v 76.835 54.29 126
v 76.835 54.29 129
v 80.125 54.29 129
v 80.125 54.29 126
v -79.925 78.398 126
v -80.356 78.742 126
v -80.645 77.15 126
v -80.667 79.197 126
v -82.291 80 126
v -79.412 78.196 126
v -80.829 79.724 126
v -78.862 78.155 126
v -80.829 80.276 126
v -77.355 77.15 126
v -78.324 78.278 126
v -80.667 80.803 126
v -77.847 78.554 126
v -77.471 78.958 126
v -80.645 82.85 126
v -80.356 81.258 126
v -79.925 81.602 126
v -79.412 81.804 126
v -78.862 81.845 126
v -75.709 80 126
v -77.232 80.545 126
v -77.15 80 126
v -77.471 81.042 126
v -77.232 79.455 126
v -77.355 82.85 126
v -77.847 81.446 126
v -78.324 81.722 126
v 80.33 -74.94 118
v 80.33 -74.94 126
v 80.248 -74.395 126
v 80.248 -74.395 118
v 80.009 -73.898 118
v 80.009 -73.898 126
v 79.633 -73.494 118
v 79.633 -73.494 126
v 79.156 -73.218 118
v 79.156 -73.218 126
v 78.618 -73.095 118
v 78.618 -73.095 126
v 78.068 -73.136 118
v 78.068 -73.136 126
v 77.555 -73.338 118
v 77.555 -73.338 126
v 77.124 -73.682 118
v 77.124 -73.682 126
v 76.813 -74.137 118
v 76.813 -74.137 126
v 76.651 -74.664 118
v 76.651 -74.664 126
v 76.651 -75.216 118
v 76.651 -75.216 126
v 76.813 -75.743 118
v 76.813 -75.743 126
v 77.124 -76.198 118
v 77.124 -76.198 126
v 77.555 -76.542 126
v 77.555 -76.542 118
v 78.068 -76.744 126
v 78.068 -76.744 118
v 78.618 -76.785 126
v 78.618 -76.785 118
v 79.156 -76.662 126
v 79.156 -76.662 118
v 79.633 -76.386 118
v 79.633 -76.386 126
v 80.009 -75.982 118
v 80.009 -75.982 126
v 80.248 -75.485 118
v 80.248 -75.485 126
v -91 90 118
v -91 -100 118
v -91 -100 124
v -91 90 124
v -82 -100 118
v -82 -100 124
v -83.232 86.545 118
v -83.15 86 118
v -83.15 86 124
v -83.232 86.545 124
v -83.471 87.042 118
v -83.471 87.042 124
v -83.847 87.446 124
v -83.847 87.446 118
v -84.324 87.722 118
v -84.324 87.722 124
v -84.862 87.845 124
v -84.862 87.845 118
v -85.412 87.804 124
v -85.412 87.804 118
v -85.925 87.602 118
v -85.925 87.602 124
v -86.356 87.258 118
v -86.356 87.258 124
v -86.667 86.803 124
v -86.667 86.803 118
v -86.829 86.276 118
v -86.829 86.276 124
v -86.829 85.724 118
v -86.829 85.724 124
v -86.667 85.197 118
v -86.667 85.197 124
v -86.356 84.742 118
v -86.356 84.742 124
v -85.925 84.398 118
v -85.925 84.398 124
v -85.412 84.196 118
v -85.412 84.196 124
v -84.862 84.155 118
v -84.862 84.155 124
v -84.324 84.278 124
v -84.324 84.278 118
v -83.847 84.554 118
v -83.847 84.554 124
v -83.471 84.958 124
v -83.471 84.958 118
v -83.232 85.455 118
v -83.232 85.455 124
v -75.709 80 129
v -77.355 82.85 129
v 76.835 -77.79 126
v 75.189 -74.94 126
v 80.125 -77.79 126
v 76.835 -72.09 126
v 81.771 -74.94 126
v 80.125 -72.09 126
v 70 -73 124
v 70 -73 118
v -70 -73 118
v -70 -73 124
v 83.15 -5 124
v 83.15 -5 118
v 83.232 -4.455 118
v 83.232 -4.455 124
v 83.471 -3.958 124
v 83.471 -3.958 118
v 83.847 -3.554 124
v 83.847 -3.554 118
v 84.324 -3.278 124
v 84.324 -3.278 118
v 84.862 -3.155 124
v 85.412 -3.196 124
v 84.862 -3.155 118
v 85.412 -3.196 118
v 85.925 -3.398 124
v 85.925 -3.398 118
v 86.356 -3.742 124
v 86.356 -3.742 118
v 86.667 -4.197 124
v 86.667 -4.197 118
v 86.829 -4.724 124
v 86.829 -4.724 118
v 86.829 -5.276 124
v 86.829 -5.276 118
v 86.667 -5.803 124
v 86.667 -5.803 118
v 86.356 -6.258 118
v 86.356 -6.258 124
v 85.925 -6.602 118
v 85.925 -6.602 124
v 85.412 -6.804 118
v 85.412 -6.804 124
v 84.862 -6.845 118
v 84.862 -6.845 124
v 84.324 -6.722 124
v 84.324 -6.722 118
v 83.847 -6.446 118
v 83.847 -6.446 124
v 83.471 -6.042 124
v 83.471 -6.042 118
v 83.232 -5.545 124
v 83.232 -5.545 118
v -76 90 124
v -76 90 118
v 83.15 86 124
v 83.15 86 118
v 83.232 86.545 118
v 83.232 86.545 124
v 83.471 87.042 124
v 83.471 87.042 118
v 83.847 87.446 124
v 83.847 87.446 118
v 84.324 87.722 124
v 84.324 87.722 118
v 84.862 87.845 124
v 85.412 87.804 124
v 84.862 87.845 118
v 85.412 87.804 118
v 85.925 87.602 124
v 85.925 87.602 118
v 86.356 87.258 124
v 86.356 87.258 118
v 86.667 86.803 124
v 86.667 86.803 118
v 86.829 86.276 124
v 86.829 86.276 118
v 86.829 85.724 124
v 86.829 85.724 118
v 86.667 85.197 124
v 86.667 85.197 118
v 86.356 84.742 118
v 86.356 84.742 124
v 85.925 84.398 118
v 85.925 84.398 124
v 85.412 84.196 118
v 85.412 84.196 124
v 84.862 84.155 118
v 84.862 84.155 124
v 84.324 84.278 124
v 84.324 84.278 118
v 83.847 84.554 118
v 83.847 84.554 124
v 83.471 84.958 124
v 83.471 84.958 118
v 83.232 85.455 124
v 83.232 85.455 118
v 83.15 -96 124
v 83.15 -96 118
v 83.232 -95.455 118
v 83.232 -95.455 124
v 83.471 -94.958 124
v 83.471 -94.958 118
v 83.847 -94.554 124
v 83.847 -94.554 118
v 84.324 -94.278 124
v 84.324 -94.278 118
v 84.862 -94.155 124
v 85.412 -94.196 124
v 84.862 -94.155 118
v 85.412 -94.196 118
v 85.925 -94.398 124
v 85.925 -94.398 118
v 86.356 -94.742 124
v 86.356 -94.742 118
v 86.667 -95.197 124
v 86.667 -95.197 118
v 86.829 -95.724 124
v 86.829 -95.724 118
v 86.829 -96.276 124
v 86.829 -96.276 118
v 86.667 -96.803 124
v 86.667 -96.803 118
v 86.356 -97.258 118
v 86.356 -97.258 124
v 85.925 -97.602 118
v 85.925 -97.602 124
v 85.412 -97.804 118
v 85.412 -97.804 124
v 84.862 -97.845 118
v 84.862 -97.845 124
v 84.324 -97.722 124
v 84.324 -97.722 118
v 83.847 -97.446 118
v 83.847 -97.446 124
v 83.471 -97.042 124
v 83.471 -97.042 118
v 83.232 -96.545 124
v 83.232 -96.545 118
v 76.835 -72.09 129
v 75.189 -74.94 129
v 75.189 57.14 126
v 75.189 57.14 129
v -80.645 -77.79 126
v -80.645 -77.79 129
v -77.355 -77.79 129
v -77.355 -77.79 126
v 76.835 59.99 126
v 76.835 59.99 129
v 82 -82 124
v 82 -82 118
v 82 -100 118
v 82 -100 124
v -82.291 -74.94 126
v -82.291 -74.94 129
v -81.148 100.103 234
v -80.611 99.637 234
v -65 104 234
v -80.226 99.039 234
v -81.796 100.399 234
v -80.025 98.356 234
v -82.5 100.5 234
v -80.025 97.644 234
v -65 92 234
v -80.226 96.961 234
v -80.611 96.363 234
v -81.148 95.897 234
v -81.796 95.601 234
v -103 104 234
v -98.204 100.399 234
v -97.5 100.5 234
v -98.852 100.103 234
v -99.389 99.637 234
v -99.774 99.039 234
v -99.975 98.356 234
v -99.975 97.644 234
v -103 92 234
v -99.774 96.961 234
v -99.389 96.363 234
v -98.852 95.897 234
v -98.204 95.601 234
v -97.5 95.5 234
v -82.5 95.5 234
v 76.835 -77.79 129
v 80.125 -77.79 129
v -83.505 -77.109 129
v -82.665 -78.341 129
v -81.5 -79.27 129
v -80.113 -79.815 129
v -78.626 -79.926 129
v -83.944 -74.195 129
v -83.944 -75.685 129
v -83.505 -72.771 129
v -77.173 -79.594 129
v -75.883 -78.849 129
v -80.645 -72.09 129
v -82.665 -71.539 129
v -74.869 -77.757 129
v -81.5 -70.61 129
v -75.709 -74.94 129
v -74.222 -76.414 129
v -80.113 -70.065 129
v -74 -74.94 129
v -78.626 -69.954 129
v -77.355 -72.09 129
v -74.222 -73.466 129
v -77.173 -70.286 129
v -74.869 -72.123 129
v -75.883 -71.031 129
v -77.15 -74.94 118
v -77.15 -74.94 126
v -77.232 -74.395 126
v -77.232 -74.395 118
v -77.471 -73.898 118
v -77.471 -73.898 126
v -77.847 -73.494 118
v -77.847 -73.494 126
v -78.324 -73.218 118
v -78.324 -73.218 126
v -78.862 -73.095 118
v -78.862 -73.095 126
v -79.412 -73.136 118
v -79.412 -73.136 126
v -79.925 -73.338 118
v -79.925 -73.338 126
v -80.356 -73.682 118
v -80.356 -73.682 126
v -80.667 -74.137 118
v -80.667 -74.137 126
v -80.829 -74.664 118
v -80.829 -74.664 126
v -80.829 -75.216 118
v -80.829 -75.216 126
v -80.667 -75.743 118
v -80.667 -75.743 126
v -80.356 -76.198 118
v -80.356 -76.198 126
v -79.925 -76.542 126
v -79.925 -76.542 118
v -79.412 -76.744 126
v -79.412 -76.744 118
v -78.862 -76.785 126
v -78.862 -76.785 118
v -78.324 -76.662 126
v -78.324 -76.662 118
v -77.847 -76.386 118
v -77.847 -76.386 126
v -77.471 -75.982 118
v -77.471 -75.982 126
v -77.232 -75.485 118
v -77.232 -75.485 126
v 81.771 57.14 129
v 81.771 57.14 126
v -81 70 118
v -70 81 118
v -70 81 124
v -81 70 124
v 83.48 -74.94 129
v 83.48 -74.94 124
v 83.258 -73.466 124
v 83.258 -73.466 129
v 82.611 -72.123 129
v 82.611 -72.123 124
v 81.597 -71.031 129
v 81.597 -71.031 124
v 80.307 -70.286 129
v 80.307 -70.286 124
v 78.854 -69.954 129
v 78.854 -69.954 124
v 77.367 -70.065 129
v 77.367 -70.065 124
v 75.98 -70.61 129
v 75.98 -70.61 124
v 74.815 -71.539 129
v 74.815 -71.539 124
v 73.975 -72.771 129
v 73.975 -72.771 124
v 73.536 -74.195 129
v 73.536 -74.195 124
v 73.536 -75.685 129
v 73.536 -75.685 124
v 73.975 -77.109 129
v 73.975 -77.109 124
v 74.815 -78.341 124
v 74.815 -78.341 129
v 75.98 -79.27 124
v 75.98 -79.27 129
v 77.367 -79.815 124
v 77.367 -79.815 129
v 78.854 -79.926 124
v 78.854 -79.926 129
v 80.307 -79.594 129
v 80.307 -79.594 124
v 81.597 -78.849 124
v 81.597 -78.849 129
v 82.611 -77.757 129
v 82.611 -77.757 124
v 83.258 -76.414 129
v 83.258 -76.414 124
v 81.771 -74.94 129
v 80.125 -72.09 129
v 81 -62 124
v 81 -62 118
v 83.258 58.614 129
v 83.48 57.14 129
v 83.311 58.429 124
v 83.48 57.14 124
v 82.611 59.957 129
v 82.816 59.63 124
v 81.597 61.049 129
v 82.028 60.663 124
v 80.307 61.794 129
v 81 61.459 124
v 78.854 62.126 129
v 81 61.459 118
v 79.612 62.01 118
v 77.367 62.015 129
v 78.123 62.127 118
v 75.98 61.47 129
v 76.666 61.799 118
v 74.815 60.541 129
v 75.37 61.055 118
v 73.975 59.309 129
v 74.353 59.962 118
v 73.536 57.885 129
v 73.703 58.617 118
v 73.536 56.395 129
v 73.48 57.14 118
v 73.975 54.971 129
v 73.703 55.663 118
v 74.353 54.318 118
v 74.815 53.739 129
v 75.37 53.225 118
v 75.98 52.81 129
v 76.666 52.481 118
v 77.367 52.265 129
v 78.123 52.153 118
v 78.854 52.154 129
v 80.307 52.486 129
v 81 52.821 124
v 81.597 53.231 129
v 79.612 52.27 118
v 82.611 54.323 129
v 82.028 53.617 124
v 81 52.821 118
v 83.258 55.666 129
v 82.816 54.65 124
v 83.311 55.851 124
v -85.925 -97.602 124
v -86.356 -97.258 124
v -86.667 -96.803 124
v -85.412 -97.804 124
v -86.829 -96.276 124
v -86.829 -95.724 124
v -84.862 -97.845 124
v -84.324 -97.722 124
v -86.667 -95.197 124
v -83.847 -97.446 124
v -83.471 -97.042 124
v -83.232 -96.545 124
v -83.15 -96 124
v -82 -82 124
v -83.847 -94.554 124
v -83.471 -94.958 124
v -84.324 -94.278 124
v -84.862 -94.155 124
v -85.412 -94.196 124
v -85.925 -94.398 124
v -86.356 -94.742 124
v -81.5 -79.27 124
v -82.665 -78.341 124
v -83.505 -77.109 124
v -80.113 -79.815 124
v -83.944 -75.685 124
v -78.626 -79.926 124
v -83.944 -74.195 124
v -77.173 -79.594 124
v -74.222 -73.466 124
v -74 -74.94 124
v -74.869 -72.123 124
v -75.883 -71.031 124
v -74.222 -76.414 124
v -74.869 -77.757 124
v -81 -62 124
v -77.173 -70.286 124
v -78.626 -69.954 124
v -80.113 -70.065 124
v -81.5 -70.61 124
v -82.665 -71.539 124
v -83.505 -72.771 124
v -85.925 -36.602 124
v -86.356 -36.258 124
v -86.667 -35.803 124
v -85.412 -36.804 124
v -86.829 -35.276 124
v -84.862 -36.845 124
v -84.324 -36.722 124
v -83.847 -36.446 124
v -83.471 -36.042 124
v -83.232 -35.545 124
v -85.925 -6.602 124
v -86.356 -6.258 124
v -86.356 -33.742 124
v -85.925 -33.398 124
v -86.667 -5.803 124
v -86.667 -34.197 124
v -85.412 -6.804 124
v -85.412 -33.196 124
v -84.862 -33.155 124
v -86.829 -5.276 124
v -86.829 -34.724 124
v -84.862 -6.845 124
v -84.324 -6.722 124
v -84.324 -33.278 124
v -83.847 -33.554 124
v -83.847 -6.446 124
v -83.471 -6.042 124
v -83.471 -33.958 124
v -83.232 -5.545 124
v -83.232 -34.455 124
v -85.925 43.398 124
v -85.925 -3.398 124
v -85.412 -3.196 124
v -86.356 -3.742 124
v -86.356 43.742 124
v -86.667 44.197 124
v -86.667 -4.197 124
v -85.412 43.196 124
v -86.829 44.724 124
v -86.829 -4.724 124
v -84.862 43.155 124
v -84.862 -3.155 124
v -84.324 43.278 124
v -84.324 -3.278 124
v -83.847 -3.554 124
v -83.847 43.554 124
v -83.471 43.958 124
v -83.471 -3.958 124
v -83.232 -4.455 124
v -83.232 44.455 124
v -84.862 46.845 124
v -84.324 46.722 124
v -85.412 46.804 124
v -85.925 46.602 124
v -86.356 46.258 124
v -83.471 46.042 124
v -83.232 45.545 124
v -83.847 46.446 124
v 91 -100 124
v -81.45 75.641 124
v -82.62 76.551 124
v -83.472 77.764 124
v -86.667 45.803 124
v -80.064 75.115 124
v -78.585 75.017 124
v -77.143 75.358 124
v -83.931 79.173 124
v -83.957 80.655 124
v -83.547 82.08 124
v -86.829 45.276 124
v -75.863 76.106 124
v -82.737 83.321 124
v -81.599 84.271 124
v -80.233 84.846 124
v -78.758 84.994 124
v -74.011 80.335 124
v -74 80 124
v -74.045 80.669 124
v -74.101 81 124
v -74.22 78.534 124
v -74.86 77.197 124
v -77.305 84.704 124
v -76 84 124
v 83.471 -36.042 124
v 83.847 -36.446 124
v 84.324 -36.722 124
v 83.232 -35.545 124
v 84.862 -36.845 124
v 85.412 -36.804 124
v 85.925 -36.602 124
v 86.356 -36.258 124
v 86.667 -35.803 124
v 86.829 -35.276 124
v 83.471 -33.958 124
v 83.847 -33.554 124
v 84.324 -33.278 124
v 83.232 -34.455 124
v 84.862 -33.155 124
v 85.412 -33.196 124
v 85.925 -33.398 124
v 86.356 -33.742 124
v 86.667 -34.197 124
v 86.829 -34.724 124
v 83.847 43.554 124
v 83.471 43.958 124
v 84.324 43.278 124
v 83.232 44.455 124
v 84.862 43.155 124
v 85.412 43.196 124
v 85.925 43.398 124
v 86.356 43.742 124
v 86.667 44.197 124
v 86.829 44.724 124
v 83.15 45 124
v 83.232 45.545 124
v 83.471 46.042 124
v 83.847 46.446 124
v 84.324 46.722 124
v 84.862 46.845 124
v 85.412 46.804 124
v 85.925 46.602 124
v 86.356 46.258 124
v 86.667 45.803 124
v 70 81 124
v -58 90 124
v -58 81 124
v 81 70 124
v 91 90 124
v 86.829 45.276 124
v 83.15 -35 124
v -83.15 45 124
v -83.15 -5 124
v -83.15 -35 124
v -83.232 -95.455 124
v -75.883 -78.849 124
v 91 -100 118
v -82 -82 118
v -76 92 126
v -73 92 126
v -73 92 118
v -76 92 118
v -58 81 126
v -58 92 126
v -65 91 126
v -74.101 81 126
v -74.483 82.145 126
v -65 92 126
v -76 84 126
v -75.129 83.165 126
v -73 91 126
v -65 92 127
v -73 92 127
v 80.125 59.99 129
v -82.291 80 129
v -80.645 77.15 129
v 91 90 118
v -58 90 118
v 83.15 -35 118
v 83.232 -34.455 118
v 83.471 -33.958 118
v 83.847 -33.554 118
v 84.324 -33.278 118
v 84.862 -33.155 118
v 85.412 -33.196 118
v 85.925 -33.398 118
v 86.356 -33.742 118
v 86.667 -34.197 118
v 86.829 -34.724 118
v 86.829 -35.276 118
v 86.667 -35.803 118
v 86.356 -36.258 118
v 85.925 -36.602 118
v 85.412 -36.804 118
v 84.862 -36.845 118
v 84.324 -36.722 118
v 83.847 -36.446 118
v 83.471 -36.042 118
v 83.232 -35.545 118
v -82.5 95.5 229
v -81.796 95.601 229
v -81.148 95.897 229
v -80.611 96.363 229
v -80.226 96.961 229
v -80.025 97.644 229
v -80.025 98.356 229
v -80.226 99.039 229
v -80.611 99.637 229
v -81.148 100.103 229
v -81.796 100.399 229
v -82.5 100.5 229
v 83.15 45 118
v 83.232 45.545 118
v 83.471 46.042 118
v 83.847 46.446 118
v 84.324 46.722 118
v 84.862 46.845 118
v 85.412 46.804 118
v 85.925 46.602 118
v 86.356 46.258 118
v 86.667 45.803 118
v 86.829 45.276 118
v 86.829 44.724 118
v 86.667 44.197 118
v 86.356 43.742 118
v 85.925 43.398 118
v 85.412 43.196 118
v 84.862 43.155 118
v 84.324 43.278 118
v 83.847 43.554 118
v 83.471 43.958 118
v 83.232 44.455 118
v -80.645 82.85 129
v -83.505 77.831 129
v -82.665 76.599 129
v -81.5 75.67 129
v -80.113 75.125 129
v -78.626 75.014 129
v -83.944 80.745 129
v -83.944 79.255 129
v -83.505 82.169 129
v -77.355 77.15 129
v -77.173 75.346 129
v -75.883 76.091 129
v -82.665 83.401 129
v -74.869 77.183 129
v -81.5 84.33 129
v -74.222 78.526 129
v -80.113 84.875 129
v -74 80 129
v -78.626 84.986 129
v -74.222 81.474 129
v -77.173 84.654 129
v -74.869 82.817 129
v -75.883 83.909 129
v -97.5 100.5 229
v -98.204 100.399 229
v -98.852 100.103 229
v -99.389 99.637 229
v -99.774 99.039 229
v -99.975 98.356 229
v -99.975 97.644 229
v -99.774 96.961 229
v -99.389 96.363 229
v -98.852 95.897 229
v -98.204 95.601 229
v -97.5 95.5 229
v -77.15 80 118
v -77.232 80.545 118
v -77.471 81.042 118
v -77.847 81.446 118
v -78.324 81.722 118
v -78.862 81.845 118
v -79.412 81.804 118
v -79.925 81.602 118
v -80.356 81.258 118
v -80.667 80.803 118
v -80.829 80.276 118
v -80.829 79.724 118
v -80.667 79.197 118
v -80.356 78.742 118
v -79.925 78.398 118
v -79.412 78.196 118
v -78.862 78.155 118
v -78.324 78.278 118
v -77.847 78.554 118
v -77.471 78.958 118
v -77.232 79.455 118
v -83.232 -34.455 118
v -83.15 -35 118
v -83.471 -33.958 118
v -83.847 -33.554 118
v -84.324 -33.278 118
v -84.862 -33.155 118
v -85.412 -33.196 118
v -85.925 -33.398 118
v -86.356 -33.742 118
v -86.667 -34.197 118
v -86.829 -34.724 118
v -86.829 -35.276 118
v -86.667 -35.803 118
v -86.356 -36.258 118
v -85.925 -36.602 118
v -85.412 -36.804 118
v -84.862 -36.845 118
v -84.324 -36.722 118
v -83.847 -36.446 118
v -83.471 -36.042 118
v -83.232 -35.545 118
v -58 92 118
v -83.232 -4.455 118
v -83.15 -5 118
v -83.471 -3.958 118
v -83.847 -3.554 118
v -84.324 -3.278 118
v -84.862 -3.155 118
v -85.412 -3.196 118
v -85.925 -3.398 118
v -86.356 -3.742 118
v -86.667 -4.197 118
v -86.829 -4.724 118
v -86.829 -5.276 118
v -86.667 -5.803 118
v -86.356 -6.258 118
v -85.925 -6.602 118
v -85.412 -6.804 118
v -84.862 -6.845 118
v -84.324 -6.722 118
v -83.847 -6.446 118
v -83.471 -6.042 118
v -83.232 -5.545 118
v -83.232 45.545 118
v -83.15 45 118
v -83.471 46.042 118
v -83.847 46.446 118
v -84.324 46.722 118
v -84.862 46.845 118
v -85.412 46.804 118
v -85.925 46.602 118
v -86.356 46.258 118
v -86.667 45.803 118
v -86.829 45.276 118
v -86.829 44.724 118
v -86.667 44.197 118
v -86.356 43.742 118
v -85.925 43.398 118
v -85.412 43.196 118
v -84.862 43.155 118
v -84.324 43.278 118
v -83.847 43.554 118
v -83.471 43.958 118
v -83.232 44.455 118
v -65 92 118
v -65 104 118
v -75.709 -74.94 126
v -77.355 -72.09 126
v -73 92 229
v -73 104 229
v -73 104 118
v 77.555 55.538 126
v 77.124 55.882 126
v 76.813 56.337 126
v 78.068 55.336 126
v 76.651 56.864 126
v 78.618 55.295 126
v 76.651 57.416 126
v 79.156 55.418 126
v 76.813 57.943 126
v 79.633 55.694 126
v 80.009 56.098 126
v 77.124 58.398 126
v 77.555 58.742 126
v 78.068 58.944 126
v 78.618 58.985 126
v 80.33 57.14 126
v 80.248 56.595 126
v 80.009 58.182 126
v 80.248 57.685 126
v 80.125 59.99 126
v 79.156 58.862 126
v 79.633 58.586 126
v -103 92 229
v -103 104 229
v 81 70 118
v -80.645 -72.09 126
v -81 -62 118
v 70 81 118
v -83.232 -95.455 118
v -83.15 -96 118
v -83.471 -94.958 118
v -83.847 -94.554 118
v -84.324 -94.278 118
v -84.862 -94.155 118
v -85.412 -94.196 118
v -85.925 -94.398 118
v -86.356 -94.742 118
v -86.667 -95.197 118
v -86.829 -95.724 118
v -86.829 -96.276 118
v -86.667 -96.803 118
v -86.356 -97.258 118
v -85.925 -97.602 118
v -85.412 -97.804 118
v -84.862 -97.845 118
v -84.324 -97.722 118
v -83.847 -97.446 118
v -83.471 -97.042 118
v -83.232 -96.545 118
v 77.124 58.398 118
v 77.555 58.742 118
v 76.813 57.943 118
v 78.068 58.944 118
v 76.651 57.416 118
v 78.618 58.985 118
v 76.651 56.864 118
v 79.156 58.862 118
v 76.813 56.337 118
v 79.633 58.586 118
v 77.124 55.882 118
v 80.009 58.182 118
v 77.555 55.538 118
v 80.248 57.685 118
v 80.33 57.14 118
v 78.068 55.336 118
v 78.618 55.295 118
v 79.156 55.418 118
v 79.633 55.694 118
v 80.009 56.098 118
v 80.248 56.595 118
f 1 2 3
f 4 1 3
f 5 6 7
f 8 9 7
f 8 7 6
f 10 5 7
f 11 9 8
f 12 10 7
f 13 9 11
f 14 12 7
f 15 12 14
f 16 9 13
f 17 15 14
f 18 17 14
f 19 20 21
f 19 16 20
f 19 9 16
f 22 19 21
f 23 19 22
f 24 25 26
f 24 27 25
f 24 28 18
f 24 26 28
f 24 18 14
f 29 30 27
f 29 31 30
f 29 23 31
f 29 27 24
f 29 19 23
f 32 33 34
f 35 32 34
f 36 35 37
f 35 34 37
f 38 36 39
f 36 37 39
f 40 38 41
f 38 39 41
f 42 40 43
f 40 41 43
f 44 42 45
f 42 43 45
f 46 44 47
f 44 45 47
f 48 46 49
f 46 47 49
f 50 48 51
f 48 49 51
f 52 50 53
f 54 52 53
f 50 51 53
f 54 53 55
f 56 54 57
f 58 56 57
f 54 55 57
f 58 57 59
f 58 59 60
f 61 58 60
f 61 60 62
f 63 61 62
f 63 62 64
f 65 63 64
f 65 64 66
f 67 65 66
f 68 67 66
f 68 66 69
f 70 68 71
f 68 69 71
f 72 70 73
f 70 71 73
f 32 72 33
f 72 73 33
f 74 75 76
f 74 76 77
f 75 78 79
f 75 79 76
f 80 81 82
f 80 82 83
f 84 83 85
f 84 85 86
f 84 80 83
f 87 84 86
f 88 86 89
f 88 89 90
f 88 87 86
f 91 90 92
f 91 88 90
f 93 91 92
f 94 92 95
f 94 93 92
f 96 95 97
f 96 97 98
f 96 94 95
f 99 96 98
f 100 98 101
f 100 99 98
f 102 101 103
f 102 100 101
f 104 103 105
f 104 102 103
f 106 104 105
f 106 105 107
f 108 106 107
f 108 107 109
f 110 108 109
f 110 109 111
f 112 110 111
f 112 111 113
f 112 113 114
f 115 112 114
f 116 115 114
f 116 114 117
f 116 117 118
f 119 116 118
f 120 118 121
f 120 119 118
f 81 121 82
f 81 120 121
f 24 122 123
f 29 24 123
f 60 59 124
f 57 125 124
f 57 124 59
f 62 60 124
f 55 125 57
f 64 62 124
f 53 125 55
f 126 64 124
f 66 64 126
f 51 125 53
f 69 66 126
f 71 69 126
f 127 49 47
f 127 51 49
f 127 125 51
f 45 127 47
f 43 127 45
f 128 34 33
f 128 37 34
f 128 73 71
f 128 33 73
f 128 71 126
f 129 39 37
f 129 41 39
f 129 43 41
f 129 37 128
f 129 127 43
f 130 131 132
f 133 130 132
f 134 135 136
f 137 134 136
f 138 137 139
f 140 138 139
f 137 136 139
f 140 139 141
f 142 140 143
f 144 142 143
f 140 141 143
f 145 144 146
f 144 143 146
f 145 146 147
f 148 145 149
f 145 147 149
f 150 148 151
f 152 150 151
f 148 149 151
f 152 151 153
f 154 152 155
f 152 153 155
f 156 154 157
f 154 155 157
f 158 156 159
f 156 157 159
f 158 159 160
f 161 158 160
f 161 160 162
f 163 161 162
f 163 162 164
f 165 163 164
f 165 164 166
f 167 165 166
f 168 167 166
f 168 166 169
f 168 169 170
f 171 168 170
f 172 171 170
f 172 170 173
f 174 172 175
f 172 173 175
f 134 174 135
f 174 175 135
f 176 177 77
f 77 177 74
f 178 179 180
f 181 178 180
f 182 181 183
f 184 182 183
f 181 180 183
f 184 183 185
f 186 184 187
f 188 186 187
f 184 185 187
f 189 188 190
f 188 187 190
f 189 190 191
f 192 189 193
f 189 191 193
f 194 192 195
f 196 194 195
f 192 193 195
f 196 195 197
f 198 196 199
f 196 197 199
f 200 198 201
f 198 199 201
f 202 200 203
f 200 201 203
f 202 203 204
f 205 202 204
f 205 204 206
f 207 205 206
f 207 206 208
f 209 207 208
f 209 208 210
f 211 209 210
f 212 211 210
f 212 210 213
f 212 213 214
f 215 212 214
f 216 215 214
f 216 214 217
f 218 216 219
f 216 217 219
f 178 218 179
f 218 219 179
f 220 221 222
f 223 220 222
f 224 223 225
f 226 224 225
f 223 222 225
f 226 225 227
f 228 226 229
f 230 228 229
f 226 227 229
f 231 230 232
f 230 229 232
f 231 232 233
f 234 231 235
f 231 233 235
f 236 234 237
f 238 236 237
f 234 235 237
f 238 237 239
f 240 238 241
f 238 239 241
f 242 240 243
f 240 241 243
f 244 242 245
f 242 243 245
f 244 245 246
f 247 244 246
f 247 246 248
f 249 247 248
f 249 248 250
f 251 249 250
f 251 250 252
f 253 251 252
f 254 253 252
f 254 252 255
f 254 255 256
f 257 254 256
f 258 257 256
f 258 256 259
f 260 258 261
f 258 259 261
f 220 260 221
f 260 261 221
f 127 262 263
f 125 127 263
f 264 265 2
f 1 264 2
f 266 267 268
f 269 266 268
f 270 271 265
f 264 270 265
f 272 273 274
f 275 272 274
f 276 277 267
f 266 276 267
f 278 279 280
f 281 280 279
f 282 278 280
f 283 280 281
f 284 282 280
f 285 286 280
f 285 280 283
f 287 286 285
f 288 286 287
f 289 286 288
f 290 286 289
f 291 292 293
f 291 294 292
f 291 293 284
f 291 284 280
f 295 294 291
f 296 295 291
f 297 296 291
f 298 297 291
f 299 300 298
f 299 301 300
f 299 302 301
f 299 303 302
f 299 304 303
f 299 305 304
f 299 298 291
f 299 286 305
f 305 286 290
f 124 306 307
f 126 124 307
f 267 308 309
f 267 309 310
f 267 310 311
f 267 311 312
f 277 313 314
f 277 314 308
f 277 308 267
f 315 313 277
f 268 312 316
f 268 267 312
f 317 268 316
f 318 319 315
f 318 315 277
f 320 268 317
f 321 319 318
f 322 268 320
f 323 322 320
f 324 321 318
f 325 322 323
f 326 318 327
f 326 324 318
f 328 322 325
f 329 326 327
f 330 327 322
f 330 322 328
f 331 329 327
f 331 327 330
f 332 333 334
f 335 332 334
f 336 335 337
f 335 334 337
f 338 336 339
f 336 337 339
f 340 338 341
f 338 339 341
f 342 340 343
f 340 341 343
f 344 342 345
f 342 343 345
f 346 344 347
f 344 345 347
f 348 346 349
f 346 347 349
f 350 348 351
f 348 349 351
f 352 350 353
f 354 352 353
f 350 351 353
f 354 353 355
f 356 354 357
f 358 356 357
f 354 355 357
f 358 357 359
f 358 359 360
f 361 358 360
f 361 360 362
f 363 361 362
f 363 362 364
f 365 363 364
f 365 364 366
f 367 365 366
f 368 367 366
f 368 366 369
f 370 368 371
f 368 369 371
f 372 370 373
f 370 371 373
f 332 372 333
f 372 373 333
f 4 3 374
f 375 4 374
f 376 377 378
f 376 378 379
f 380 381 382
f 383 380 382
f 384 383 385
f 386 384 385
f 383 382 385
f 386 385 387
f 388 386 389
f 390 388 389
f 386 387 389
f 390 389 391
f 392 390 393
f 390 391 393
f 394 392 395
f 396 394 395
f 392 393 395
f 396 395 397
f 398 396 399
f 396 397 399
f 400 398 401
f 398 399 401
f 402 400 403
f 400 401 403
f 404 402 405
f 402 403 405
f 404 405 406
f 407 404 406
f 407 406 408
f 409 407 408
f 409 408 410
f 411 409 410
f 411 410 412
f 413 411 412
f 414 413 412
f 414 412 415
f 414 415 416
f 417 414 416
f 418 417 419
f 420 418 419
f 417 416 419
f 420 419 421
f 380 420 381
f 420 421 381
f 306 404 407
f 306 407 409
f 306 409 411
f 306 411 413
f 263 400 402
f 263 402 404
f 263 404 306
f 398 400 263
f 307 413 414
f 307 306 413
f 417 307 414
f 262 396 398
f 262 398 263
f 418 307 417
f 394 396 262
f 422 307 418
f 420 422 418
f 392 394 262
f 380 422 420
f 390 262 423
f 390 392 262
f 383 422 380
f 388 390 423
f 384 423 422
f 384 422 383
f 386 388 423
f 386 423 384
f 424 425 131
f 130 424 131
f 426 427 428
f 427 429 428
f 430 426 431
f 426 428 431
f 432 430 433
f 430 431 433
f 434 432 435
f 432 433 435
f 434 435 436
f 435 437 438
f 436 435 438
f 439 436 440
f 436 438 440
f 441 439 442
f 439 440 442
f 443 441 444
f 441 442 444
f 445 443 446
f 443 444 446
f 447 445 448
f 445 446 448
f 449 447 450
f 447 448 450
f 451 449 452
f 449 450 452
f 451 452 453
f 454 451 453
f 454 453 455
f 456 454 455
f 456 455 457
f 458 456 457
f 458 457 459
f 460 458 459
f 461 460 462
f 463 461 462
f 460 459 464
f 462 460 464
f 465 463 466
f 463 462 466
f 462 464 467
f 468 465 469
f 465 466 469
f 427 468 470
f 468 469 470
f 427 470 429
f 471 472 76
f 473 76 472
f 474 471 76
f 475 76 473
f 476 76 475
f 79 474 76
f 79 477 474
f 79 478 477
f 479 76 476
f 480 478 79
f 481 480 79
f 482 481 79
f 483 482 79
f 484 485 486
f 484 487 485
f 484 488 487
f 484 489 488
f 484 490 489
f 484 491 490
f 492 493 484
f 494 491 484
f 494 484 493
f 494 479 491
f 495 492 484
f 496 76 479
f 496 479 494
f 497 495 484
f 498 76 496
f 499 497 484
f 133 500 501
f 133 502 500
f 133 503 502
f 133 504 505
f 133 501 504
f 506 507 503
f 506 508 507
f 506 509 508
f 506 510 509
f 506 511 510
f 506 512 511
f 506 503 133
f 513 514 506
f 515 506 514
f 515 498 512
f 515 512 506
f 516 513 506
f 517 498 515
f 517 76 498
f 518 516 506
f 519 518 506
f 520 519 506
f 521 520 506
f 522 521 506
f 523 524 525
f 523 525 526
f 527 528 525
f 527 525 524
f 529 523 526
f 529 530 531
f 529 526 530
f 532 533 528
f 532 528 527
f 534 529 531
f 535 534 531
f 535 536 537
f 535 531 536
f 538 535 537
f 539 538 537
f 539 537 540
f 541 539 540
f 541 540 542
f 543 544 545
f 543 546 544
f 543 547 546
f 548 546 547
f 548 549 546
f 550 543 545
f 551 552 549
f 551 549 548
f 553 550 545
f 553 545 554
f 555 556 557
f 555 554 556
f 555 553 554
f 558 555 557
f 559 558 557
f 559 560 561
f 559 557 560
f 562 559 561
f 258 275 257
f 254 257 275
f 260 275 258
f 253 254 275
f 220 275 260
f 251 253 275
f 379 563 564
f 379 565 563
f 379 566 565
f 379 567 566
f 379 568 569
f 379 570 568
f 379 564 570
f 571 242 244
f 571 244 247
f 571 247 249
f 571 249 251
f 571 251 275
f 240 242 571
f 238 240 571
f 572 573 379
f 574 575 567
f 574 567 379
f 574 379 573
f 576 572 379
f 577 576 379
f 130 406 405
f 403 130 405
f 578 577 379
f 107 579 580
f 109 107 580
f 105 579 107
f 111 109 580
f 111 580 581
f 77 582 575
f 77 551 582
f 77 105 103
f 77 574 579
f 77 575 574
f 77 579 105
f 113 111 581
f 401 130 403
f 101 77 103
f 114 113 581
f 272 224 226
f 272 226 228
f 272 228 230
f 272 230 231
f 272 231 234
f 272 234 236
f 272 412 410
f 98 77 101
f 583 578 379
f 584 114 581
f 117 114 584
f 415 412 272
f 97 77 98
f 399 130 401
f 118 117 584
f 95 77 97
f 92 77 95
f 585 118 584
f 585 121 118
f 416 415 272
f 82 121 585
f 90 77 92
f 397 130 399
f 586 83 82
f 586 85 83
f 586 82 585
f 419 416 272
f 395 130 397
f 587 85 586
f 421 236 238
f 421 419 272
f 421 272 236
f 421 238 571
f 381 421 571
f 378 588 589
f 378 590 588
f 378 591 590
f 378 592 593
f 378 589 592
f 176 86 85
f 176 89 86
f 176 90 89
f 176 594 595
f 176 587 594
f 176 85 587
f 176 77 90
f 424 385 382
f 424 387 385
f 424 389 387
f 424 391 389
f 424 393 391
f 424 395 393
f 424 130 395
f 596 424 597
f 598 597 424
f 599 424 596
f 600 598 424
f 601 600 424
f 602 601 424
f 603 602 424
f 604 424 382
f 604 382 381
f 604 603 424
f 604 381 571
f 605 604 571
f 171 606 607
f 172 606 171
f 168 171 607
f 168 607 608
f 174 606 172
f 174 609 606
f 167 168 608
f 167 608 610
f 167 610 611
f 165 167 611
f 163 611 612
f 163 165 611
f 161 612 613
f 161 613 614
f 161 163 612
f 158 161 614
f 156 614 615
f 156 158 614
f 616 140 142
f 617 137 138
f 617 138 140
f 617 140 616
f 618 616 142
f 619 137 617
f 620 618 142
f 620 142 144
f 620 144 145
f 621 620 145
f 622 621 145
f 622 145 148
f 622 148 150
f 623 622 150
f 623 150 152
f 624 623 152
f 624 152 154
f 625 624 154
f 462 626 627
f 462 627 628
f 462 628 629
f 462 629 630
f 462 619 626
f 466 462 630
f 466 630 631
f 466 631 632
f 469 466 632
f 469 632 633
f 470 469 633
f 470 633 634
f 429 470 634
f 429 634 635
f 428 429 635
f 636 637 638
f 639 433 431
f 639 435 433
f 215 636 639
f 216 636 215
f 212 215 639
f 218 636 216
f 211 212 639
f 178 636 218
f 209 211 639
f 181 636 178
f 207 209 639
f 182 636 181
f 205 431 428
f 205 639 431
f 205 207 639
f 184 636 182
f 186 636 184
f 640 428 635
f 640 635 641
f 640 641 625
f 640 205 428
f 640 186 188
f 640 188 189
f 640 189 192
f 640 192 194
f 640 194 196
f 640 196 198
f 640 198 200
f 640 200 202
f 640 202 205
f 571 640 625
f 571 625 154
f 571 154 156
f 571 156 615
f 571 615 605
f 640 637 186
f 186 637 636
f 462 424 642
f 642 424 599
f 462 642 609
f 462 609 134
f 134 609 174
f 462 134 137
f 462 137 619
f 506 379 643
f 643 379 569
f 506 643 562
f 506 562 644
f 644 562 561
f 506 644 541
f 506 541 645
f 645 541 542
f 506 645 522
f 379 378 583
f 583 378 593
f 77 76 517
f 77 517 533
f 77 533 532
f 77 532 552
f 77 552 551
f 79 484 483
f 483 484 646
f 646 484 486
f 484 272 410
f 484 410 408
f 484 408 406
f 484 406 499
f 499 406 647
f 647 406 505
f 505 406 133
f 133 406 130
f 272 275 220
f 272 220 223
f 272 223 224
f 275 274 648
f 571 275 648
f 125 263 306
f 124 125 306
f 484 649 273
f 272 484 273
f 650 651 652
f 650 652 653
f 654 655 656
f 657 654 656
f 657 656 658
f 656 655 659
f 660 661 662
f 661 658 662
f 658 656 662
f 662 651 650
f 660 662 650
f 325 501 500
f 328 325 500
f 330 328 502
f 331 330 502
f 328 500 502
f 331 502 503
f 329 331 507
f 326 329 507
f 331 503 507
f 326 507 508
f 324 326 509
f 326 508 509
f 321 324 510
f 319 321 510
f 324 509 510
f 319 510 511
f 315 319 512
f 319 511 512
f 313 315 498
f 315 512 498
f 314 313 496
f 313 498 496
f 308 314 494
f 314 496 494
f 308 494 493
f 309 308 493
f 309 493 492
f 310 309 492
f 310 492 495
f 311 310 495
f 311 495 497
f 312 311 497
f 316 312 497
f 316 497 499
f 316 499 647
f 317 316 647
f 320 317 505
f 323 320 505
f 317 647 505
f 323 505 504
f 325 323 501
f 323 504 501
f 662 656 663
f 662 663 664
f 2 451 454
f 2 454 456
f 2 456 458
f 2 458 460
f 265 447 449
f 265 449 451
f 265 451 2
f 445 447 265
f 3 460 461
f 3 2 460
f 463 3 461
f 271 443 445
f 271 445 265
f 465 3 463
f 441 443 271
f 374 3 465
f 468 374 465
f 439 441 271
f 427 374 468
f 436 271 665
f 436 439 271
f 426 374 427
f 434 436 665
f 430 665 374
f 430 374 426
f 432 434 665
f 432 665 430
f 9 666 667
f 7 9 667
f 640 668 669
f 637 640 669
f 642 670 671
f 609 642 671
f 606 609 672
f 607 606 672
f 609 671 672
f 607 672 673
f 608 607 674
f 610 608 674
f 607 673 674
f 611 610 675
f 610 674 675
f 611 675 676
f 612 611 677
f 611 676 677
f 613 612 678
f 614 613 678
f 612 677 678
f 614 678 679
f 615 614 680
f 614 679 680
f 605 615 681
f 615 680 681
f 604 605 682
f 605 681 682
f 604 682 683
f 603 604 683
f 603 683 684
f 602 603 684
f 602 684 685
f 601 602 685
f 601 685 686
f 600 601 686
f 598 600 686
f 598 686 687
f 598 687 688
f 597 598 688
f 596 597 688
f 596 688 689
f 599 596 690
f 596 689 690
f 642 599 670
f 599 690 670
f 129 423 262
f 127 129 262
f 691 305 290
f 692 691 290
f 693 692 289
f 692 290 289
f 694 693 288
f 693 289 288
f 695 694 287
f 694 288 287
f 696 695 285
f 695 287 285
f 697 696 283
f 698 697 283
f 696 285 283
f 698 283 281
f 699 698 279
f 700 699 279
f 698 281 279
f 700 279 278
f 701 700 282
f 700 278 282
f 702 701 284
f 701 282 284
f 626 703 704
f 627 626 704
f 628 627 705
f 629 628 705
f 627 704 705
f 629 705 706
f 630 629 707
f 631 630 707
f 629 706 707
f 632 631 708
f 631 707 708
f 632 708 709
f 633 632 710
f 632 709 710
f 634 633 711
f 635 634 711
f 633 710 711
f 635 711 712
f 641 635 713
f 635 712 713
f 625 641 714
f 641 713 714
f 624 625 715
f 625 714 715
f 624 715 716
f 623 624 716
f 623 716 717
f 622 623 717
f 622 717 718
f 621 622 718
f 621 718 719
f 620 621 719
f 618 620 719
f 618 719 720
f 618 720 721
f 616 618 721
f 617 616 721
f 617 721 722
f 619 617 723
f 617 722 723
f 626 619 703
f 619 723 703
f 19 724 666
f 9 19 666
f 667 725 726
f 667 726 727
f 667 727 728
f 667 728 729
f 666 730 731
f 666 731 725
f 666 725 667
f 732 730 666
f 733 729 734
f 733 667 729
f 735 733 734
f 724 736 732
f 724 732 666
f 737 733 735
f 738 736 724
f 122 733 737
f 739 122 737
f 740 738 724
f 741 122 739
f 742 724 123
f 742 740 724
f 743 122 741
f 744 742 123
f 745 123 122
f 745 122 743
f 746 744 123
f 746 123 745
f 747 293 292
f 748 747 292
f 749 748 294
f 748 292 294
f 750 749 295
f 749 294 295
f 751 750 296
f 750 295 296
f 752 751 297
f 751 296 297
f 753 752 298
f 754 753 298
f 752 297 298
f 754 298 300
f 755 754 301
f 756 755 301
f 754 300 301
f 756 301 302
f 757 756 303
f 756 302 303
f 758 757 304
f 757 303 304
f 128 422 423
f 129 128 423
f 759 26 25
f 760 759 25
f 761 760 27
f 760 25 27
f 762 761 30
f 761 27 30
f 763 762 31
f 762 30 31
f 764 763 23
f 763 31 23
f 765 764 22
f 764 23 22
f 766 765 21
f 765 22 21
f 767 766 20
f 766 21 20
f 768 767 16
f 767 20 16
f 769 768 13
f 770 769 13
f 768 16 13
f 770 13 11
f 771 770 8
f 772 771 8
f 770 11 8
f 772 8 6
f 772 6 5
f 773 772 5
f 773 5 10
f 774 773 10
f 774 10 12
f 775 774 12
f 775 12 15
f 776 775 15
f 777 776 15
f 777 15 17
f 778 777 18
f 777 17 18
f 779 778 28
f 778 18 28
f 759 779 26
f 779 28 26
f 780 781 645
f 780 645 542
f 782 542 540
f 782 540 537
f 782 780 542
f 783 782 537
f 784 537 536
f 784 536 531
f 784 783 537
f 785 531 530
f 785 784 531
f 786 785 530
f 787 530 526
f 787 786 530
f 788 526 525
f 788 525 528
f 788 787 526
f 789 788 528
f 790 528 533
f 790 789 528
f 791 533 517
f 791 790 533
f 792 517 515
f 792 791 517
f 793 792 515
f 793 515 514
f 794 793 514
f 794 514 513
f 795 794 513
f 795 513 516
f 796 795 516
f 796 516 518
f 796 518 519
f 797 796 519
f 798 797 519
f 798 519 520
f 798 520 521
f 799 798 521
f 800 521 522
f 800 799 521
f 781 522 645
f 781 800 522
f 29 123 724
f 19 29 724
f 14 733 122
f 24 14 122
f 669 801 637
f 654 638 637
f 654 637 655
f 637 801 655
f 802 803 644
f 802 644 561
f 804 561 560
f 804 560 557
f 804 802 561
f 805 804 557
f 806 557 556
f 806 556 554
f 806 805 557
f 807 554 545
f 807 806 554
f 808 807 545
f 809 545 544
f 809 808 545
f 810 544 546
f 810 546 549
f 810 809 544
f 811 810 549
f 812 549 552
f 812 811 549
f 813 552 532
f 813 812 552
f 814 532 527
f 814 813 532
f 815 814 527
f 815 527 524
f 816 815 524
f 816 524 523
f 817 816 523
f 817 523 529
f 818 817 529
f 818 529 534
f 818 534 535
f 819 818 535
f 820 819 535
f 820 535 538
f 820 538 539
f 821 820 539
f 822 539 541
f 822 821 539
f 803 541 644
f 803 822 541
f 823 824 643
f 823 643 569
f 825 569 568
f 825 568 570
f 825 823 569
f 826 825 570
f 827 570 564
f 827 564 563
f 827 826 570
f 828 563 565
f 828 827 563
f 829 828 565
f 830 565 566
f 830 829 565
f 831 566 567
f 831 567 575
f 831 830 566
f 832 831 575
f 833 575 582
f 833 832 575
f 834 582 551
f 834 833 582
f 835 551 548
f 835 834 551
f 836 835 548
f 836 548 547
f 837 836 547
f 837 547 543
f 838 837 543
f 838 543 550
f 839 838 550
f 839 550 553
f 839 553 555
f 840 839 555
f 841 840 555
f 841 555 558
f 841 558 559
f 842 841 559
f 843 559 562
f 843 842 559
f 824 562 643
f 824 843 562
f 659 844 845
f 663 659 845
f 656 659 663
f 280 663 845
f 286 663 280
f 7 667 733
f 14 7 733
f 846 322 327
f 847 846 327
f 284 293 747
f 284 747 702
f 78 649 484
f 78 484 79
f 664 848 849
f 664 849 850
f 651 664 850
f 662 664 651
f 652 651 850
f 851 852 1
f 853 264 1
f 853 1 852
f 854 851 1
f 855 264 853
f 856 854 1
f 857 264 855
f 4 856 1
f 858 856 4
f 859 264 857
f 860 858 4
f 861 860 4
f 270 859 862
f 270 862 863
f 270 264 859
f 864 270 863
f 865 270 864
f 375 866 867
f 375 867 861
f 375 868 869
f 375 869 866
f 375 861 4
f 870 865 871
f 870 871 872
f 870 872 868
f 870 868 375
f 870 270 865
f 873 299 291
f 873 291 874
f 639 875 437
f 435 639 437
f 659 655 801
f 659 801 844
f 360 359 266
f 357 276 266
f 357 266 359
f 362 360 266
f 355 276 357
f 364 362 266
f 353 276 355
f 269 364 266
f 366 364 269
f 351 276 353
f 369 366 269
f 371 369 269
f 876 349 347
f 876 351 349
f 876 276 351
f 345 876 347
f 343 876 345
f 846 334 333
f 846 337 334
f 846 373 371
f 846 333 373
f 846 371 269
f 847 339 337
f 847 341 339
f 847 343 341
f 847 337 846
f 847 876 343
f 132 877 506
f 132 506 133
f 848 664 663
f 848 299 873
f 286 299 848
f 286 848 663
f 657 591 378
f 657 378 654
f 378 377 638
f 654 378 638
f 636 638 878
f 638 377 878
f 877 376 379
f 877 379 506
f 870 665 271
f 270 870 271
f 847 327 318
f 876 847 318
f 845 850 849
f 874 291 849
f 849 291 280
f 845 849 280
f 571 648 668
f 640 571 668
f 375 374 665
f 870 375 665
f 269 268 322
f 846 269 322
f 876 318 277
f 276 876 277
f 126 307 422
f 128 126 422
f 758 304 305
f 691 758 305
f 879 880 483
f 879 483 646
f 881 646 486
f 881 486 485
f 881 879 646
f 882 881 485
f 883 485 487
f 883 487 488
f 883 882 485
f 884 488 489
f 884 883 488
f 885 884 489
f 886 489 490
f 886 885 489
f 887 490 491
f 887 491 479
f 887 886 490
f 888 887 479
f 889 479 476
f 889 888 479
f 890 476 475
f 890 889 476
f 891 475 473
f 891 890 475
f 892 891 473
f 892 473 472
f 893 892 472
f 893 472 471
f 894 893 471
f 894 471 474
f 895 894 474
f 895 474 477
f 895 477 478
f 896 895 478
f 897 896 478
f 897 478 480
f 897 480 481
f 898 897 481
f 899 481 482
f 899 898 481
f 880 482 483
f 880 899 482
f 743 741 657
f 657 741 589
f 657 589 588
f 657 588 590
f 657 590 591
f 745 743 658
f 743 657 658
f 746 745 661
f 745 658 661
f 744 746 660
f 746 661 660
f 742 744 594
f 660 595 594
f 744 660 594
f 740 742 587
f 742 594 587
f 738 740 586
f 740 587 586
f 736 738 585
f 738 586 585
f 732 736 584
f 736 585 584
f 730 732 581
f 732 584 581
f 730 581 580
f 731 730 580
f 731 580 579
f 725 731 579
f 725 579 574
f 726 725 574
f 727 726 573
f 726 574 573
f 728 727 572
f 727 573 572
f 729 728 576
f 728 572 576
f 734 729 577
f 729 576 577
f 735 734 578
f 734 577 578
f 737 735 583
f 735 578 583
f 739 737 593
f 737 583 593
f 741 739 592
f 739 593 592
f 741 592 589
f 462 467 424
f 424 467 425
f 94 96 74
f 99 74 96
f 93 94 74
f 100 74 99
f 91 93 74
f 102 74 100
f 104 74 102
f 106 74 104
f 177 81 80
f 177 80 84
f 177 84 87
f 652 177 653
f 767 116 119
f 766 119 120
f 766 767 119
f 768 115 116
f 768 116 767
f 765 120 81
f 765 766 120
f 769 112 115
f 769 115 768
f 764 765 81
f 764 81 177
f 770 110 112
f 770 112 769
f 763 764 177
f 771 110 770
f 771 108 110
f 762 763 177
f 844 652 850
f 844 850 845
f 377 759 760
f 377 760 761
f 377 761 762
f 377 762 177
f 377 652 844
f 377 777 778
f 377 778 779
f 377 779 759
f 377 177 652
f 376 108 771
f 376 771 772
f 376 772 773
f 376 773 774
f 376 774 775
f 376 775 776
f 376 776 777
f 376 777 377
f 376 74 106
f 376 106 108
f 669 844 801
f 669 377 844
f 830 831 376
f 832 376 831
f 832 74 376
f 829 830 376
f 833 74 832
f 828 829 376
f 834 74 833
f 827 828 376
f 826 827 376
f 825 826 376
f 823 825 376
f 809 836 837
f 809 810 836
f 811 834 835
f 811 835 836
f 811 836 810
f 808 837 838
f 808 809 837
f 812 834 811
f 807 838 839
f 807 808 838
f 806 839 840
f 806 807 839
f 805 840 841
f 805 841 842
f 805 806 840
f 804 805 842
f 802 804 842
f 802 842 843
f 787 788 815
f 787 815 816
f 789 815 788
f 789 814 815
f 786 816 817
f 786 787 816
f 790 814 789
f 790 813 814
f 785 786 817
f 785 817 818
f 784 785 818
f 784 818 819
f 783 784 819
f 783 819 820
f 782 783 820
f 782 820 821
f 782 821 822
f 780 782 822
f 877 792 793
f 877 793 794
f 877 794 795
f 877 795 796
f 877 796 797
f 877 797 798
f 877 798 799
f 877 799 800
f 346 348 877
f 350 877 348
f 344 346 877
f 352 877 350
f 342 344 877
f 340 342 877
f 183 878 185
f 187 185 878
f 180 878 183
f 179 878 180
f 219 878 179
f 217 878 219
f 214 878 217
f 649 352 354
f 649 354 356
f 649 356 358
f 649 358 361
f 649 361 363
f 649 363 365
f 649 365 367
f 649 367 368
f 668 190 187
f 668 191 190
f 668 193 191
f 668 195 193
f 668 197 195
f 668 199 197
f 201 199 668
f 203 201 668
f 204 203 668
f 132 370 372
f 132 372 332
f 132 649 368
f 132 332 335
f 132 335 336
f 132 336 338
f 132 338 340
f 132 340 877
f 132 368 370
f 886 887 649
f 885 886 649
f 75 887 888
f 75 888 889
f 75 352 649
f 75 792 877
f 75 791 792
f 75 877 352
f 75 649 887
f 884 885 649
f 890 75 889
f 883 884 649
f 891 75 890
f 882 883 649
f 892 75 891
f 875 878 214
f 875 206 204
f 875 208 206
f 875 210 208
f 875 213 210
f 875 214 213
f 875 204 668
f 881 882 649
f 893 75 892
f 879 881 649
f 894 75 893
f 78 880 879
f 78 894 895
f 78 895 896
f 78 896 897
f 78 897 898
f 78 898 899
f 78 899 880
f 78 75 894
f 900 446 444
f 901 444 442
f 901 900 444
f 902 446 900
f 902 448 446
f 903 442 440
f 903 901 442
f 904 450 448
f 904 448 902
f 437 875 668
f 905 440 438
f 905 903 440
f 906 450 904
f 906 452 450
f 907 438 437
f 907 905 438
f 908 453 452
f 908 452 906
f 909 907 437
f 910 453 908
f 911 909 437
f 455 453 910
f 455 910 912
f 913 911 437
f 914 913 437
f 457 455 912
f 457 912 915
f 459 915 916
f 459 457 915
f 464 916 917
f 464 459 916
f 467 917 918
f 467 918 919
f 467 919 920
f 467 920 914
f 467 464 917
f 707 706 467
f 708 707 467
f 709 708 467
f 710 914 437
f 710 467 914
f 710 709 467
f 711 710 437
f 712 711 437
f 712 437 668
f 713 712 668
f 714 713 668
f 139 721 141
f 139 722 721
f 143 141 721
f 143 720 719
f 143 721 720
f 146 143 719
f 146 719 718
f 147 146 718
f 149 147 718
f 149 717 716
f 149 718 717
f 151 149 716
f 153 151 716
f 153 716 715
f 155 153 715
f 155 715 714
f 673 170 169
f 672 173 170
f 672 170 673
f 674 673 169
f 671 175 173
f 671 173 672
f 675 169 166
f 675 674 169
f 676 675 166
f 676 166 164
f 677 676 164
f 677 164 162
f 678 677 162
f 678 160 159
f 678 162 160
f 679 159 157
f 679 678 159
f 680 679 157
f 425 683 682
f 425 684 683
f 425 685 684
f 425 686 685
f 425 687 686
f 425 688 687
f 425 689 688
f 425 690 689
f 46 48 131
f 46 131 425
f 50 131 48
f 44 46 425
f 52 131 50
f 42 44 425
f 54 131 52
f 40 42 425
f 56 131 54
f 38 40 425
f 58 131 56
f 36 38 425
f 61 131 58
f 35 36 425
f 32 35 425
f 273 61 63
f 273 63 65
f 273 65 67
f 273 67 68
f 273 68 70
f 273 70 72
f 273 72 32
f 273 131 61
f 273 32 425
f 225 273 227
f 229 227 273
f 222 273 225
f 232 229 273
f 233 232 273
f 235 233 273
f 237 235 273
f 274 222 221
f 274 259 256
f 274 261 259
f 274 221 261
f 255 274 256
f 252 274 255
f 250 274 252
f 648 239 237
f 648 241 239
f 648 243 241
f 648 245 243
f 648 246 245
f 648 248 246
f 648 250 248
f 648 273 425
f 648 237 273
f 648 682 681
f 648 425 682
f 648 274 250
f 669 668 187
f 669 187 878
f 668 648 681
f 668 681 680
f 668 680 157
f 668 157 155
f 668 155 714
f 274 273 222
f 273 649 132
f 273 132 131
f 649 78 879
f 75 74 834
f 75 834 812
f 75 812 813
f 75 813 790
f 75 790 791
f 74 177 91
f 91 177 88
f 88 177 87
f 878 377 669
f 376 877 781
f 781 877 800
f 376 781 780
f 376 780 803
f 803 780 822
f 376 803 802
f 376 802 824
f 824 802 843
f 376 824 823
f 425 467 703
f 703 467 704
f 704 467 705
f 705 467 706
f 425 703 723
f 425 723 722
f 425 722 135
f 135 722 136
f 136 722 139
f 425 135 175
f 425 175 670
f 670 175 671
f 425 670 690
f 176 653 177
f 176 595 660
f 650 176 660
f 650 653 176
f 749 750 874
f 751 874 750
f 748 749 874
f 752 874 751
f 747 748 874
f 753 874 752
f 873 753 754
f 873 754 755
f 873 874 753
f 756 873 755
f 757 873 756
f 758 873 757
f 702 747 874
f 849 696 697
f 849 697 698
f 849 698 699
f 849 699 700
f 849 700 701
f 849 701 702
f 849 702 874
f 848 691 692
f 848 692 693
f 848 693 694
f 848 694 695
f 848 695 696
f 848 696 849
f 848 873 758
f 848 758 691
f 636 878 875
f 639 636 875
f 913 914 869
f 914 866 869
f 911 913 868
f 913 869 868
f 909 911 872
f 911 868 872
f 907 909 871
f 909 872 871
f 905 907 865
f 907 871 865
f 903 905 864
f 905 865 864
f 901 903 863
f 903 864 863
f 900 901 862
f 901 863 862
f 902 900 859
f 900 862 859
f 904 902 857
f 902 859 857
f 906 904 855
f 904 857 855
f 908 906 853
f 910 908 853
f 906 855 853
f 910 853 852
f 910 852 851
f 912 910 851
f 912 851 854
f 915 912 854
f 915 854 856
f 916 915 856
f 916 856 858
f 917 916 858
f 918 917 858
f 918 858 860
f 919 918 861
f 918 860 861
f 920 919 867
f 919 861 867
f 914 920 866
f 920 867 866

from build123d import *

# Parameters (mm, degrees)
SKETCH158_R          = 1.85
PAD009_DEPTH         = 6
SKETCH159_R          = 5
PAD010_DEPTH         = 5
PAD010_DEPTH_BACK    = 6
SKETCH160_R          = 1.85
POCKET006_DEPTH      = 6.001
POCKET006_DEPTH_BACK = 5.001
POCKET007_DEPTH      = 3
SKETCH162_W          = 18
SKETCH162_H          = 8
PAD011_DEPTH         = 2
PAD011_DEPTH_BACK    = 9
PAD012_DEPTH         = 12
POCKET008_DEPTH      = 5
CHAMFER_SIZE         = 1


with BuildPart() as part:
    # Sketch158 → Pad009 (new body)
    with BuildSketch(Plane.XY):
        Polygon((-91, -102), (-91, 88), (0, 88), (0, 79), (-70, 79), (-81, 68), (-81, -64), (-70, -75), (0, -75), (0, -84), (-82, -84), (-82, -102), align=None)
        with Locations((-85, 84)):
            Circle(SKETCH158_R, mode=Mode.SUBTRACT)
        with Locations((-85, -7)):
            Circle(SKETCH158_R, mode=Mode.SUBTRACT)
        with Locations((-85, -98)):
            Circle(SKETCH158_R, mode=Mode.SUBTRACT)
        with Locations((-85, 43)):
            Circle(SKETCH158_R, mode=Mode.SUBTRACT)
        with Locations((-85, -37)):
            Circle(SKETCH158_R, mode=Mode.SUBTRACT)
    pad009 = extrude(amount=PAD009_DEPTH)

    # Mirrored: Pad009 across Sketch158 V_Axis
    add(pad009.mirror(Plane(origin=(0, 0, 0), x_dir=(0, 0, 1), z_dir=(1, 0, 0))))

    # Sketch159 → Pad010 (join, two sides)
    with BuildSketch(Plane.XY.offset(6)) as pad010_sk:
        with Locations((-79, 78)):
            Circle(SKETCH159_R)
        with Locations((-79, -76.94)):
            Circle(SKETCH159_R)
        with Locations((78.48, -76.94)):
            Circle(SKETCH159_R)
        with Locations((78.48, 55.14)):
            Circle(SKETCH159_R)
    extrude(amount=PAD010_DEPTH)
    extrude(pad010_sk.sketch, amount=-PAD010_DEPTH_BACK)

    # Sketch160 → Pocket006 (cut, two sides)
    with BuildSketch(Plane.XY.offset(6)) as pocket006_sk:
        with Locations((-79, 78)):
            Circle(SKETCH160_R)
        with Locations((-79, -76.94)):
            Circle(SKETCH160_R)
        with Locations((78.48, -76.94)):
            Circle(SKETCH160_R)
        with Locations((78.48, 55.14)):
            Circle(SKETCH160_R)
    extrude(amount=-POCKET006_DEPTH, mode=Mode.SUBTRACT)
    extrude(pocket006_sk.sketch, amount=POCKET006_DEPTH_BACK, mode=Mode.SUBTRACT)

    # Sketch161 → Pocket007 (cut)
    with BuildSketch(Plane.XY.offset(11)):
        Polygon((-75.709103, 78), (-77.354552, 80.85), (-80.645448, 80.85), (-82.290897, 78), (-80.645448, 75.15), (-77.354552, 75.15), align=None)
        Polygon((81.770897, 55.14), (80.125448, 57.99), (76.834552, 57.99), (75.189103, 55.14), (76.834552, 52.29), (80.125448, 52.29), align=None)
        Polygon((81.770897, -76.94), (80.125448, -74.09), (76.834552, -74.09), (75.189103, -76.94), (76.834552, -79.79), (80.125448, -79.79), align=None)
        Polygon((-75.709103, -76.94), (-77.354552, -74.09), (-80.645448, -74.09), (-82.290897, -76.94), (-80.645448, -79.79), (-77.354552, -79.79), align=None)
    extrude(amount=-POCKET007_DEPTH, mode=Mode.SUBTRACT)

    # Sketch162 → Pad011 (join, two sides)
    with BuildSketch(Plane(origin=(0, 88, 0), x_dir=(-1, 0, 0), z_dir=(0, 1, 0))) as pad011_sk:
        with Locations((67, 4)):
            Rectangle(SKETCH162_W, SKETCH162_H)
    extrude(amount=PAD011_DEPTH)
    extrude(pad011_sk.sketch, amount=-PAD011_DEPTH_BACK)

    # Sketch166 (on Face53 of Pad011) → Pad012 (join)
    with BuildSketch(Plane(origin=(0, 90, 0), x_dir=(-1, 0, 0), z_dir=(0, 1, 0))):
        Polygon((73, 0), (65, 0), (65, 116), (103, 116), (103, 111), (73, 111), align=None)
    extrude(amount=PAD012_DEPTH)

    # Sketch167 (on Face88 of Pad012) → Pocket008 (cut)
    with BuildSketch(Plane.XY.offset(116)):
        with BuildLine():
            ThreePointArc((-97.5, 98.5), (-100, 96), (-97.5, 93.5))
            Line((-97.5, 93.5), (-82.5, 93.5))
            ThreePointArc((-82.5, 93.5), (-80, 96), (-82.5, 98.5))
            Line((-97.5, 98.5), (-82.5, 98.5))
        make_face()
    extrude(amount=-POCKET008_DEPTH, mode=Mode.SUBTRACT)

    # Chamfer
    chamfer_edges = [part.edges().sort_by_distance(p)[0] for p in [
        (-69, 90, 8),
    ]]
    chamfer(chamfer_edges, length=CHAMFER_SIZE)


with BuildPart() as part_1:
    # Body006 placement: moved
    add(part.part.moved(Location((0, 2, 118))))


solid = part_1.part
